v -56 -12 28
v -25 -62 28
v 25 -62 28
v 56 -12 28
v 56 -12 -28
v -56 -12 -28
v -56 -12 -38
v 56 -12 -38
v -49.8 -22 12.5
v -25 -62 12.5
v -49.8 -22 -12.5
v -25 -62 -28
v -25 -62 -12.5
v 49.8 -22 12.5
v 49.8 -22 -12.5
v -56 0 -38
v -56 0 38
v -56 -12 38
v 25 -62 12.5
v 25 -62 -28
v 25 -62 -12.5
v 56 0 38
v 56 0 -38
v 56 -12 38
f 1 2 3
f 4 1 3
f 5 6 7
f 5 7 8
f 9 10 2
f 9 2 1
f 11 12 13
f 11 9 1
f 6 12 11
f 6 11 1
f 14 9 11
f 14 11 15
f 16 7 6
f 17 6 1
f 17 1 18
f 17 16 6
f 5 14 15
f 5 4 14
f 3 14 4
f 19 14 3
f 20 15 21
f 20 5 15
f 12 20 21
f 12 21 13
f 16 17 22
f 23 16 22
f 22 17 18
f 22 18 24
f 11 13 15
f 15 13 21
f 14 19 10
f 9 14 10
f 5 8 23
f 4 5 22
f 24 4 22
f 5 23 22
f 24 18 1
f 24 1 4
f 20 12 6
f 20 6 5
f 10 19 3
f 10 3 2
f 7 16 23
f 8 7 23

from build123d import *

# Parameters (mm, degrees)
F0_W     = 112
F0_H     = 76
F1_DEPTH = 12
F4_DEPTH = 56
F5_W     = 46.2375640869
F5_H     = 25
F6_DEPTH = 40


with BuildPart() as f1:
    # F0 (on Front) → F1 (new body)
    with BuildSketch(Plane.XZ):
        Rectangle(F0_W, F0_H)
    extrude(amount=F1_DEPTH)

    # F3 (on offset) → F4 (join)
    with BuildSketch(Plane(origin=(0, 0, -28), x_dir=(1, 0, 0), z_dir=(0, 0, -1))):
        Polygon((-25, 62), (-56, 12), (56, 12), (25, 62), align=None)
    extrude(amount=-F4_DEPTH)

    # F5 (on face) → F6 (cut)
    with BuildSketch(Plane.XZ.offset(62)):
        Polygon((-33.4565163767, -12.5), (-25, -12.5), (-25, 12.5), (-33.4565163767, 12.5), (-89.381583035, 12.5), (-89.381583035, -12.5), align=None)
        with Locations((48.1187820435, 0)):
            Rectangle(F5_W, F5_H)
        Polygon((-25, -12.5), (24.235787726, -12.5), (25, -12.5), (25, 12.5), (24.235787726, 12.5), (-25, 12.5), align=None)
    extrude(amount=-F6_DEPTH, mode=Mode.SUBTRACT)


solid = f1.part
